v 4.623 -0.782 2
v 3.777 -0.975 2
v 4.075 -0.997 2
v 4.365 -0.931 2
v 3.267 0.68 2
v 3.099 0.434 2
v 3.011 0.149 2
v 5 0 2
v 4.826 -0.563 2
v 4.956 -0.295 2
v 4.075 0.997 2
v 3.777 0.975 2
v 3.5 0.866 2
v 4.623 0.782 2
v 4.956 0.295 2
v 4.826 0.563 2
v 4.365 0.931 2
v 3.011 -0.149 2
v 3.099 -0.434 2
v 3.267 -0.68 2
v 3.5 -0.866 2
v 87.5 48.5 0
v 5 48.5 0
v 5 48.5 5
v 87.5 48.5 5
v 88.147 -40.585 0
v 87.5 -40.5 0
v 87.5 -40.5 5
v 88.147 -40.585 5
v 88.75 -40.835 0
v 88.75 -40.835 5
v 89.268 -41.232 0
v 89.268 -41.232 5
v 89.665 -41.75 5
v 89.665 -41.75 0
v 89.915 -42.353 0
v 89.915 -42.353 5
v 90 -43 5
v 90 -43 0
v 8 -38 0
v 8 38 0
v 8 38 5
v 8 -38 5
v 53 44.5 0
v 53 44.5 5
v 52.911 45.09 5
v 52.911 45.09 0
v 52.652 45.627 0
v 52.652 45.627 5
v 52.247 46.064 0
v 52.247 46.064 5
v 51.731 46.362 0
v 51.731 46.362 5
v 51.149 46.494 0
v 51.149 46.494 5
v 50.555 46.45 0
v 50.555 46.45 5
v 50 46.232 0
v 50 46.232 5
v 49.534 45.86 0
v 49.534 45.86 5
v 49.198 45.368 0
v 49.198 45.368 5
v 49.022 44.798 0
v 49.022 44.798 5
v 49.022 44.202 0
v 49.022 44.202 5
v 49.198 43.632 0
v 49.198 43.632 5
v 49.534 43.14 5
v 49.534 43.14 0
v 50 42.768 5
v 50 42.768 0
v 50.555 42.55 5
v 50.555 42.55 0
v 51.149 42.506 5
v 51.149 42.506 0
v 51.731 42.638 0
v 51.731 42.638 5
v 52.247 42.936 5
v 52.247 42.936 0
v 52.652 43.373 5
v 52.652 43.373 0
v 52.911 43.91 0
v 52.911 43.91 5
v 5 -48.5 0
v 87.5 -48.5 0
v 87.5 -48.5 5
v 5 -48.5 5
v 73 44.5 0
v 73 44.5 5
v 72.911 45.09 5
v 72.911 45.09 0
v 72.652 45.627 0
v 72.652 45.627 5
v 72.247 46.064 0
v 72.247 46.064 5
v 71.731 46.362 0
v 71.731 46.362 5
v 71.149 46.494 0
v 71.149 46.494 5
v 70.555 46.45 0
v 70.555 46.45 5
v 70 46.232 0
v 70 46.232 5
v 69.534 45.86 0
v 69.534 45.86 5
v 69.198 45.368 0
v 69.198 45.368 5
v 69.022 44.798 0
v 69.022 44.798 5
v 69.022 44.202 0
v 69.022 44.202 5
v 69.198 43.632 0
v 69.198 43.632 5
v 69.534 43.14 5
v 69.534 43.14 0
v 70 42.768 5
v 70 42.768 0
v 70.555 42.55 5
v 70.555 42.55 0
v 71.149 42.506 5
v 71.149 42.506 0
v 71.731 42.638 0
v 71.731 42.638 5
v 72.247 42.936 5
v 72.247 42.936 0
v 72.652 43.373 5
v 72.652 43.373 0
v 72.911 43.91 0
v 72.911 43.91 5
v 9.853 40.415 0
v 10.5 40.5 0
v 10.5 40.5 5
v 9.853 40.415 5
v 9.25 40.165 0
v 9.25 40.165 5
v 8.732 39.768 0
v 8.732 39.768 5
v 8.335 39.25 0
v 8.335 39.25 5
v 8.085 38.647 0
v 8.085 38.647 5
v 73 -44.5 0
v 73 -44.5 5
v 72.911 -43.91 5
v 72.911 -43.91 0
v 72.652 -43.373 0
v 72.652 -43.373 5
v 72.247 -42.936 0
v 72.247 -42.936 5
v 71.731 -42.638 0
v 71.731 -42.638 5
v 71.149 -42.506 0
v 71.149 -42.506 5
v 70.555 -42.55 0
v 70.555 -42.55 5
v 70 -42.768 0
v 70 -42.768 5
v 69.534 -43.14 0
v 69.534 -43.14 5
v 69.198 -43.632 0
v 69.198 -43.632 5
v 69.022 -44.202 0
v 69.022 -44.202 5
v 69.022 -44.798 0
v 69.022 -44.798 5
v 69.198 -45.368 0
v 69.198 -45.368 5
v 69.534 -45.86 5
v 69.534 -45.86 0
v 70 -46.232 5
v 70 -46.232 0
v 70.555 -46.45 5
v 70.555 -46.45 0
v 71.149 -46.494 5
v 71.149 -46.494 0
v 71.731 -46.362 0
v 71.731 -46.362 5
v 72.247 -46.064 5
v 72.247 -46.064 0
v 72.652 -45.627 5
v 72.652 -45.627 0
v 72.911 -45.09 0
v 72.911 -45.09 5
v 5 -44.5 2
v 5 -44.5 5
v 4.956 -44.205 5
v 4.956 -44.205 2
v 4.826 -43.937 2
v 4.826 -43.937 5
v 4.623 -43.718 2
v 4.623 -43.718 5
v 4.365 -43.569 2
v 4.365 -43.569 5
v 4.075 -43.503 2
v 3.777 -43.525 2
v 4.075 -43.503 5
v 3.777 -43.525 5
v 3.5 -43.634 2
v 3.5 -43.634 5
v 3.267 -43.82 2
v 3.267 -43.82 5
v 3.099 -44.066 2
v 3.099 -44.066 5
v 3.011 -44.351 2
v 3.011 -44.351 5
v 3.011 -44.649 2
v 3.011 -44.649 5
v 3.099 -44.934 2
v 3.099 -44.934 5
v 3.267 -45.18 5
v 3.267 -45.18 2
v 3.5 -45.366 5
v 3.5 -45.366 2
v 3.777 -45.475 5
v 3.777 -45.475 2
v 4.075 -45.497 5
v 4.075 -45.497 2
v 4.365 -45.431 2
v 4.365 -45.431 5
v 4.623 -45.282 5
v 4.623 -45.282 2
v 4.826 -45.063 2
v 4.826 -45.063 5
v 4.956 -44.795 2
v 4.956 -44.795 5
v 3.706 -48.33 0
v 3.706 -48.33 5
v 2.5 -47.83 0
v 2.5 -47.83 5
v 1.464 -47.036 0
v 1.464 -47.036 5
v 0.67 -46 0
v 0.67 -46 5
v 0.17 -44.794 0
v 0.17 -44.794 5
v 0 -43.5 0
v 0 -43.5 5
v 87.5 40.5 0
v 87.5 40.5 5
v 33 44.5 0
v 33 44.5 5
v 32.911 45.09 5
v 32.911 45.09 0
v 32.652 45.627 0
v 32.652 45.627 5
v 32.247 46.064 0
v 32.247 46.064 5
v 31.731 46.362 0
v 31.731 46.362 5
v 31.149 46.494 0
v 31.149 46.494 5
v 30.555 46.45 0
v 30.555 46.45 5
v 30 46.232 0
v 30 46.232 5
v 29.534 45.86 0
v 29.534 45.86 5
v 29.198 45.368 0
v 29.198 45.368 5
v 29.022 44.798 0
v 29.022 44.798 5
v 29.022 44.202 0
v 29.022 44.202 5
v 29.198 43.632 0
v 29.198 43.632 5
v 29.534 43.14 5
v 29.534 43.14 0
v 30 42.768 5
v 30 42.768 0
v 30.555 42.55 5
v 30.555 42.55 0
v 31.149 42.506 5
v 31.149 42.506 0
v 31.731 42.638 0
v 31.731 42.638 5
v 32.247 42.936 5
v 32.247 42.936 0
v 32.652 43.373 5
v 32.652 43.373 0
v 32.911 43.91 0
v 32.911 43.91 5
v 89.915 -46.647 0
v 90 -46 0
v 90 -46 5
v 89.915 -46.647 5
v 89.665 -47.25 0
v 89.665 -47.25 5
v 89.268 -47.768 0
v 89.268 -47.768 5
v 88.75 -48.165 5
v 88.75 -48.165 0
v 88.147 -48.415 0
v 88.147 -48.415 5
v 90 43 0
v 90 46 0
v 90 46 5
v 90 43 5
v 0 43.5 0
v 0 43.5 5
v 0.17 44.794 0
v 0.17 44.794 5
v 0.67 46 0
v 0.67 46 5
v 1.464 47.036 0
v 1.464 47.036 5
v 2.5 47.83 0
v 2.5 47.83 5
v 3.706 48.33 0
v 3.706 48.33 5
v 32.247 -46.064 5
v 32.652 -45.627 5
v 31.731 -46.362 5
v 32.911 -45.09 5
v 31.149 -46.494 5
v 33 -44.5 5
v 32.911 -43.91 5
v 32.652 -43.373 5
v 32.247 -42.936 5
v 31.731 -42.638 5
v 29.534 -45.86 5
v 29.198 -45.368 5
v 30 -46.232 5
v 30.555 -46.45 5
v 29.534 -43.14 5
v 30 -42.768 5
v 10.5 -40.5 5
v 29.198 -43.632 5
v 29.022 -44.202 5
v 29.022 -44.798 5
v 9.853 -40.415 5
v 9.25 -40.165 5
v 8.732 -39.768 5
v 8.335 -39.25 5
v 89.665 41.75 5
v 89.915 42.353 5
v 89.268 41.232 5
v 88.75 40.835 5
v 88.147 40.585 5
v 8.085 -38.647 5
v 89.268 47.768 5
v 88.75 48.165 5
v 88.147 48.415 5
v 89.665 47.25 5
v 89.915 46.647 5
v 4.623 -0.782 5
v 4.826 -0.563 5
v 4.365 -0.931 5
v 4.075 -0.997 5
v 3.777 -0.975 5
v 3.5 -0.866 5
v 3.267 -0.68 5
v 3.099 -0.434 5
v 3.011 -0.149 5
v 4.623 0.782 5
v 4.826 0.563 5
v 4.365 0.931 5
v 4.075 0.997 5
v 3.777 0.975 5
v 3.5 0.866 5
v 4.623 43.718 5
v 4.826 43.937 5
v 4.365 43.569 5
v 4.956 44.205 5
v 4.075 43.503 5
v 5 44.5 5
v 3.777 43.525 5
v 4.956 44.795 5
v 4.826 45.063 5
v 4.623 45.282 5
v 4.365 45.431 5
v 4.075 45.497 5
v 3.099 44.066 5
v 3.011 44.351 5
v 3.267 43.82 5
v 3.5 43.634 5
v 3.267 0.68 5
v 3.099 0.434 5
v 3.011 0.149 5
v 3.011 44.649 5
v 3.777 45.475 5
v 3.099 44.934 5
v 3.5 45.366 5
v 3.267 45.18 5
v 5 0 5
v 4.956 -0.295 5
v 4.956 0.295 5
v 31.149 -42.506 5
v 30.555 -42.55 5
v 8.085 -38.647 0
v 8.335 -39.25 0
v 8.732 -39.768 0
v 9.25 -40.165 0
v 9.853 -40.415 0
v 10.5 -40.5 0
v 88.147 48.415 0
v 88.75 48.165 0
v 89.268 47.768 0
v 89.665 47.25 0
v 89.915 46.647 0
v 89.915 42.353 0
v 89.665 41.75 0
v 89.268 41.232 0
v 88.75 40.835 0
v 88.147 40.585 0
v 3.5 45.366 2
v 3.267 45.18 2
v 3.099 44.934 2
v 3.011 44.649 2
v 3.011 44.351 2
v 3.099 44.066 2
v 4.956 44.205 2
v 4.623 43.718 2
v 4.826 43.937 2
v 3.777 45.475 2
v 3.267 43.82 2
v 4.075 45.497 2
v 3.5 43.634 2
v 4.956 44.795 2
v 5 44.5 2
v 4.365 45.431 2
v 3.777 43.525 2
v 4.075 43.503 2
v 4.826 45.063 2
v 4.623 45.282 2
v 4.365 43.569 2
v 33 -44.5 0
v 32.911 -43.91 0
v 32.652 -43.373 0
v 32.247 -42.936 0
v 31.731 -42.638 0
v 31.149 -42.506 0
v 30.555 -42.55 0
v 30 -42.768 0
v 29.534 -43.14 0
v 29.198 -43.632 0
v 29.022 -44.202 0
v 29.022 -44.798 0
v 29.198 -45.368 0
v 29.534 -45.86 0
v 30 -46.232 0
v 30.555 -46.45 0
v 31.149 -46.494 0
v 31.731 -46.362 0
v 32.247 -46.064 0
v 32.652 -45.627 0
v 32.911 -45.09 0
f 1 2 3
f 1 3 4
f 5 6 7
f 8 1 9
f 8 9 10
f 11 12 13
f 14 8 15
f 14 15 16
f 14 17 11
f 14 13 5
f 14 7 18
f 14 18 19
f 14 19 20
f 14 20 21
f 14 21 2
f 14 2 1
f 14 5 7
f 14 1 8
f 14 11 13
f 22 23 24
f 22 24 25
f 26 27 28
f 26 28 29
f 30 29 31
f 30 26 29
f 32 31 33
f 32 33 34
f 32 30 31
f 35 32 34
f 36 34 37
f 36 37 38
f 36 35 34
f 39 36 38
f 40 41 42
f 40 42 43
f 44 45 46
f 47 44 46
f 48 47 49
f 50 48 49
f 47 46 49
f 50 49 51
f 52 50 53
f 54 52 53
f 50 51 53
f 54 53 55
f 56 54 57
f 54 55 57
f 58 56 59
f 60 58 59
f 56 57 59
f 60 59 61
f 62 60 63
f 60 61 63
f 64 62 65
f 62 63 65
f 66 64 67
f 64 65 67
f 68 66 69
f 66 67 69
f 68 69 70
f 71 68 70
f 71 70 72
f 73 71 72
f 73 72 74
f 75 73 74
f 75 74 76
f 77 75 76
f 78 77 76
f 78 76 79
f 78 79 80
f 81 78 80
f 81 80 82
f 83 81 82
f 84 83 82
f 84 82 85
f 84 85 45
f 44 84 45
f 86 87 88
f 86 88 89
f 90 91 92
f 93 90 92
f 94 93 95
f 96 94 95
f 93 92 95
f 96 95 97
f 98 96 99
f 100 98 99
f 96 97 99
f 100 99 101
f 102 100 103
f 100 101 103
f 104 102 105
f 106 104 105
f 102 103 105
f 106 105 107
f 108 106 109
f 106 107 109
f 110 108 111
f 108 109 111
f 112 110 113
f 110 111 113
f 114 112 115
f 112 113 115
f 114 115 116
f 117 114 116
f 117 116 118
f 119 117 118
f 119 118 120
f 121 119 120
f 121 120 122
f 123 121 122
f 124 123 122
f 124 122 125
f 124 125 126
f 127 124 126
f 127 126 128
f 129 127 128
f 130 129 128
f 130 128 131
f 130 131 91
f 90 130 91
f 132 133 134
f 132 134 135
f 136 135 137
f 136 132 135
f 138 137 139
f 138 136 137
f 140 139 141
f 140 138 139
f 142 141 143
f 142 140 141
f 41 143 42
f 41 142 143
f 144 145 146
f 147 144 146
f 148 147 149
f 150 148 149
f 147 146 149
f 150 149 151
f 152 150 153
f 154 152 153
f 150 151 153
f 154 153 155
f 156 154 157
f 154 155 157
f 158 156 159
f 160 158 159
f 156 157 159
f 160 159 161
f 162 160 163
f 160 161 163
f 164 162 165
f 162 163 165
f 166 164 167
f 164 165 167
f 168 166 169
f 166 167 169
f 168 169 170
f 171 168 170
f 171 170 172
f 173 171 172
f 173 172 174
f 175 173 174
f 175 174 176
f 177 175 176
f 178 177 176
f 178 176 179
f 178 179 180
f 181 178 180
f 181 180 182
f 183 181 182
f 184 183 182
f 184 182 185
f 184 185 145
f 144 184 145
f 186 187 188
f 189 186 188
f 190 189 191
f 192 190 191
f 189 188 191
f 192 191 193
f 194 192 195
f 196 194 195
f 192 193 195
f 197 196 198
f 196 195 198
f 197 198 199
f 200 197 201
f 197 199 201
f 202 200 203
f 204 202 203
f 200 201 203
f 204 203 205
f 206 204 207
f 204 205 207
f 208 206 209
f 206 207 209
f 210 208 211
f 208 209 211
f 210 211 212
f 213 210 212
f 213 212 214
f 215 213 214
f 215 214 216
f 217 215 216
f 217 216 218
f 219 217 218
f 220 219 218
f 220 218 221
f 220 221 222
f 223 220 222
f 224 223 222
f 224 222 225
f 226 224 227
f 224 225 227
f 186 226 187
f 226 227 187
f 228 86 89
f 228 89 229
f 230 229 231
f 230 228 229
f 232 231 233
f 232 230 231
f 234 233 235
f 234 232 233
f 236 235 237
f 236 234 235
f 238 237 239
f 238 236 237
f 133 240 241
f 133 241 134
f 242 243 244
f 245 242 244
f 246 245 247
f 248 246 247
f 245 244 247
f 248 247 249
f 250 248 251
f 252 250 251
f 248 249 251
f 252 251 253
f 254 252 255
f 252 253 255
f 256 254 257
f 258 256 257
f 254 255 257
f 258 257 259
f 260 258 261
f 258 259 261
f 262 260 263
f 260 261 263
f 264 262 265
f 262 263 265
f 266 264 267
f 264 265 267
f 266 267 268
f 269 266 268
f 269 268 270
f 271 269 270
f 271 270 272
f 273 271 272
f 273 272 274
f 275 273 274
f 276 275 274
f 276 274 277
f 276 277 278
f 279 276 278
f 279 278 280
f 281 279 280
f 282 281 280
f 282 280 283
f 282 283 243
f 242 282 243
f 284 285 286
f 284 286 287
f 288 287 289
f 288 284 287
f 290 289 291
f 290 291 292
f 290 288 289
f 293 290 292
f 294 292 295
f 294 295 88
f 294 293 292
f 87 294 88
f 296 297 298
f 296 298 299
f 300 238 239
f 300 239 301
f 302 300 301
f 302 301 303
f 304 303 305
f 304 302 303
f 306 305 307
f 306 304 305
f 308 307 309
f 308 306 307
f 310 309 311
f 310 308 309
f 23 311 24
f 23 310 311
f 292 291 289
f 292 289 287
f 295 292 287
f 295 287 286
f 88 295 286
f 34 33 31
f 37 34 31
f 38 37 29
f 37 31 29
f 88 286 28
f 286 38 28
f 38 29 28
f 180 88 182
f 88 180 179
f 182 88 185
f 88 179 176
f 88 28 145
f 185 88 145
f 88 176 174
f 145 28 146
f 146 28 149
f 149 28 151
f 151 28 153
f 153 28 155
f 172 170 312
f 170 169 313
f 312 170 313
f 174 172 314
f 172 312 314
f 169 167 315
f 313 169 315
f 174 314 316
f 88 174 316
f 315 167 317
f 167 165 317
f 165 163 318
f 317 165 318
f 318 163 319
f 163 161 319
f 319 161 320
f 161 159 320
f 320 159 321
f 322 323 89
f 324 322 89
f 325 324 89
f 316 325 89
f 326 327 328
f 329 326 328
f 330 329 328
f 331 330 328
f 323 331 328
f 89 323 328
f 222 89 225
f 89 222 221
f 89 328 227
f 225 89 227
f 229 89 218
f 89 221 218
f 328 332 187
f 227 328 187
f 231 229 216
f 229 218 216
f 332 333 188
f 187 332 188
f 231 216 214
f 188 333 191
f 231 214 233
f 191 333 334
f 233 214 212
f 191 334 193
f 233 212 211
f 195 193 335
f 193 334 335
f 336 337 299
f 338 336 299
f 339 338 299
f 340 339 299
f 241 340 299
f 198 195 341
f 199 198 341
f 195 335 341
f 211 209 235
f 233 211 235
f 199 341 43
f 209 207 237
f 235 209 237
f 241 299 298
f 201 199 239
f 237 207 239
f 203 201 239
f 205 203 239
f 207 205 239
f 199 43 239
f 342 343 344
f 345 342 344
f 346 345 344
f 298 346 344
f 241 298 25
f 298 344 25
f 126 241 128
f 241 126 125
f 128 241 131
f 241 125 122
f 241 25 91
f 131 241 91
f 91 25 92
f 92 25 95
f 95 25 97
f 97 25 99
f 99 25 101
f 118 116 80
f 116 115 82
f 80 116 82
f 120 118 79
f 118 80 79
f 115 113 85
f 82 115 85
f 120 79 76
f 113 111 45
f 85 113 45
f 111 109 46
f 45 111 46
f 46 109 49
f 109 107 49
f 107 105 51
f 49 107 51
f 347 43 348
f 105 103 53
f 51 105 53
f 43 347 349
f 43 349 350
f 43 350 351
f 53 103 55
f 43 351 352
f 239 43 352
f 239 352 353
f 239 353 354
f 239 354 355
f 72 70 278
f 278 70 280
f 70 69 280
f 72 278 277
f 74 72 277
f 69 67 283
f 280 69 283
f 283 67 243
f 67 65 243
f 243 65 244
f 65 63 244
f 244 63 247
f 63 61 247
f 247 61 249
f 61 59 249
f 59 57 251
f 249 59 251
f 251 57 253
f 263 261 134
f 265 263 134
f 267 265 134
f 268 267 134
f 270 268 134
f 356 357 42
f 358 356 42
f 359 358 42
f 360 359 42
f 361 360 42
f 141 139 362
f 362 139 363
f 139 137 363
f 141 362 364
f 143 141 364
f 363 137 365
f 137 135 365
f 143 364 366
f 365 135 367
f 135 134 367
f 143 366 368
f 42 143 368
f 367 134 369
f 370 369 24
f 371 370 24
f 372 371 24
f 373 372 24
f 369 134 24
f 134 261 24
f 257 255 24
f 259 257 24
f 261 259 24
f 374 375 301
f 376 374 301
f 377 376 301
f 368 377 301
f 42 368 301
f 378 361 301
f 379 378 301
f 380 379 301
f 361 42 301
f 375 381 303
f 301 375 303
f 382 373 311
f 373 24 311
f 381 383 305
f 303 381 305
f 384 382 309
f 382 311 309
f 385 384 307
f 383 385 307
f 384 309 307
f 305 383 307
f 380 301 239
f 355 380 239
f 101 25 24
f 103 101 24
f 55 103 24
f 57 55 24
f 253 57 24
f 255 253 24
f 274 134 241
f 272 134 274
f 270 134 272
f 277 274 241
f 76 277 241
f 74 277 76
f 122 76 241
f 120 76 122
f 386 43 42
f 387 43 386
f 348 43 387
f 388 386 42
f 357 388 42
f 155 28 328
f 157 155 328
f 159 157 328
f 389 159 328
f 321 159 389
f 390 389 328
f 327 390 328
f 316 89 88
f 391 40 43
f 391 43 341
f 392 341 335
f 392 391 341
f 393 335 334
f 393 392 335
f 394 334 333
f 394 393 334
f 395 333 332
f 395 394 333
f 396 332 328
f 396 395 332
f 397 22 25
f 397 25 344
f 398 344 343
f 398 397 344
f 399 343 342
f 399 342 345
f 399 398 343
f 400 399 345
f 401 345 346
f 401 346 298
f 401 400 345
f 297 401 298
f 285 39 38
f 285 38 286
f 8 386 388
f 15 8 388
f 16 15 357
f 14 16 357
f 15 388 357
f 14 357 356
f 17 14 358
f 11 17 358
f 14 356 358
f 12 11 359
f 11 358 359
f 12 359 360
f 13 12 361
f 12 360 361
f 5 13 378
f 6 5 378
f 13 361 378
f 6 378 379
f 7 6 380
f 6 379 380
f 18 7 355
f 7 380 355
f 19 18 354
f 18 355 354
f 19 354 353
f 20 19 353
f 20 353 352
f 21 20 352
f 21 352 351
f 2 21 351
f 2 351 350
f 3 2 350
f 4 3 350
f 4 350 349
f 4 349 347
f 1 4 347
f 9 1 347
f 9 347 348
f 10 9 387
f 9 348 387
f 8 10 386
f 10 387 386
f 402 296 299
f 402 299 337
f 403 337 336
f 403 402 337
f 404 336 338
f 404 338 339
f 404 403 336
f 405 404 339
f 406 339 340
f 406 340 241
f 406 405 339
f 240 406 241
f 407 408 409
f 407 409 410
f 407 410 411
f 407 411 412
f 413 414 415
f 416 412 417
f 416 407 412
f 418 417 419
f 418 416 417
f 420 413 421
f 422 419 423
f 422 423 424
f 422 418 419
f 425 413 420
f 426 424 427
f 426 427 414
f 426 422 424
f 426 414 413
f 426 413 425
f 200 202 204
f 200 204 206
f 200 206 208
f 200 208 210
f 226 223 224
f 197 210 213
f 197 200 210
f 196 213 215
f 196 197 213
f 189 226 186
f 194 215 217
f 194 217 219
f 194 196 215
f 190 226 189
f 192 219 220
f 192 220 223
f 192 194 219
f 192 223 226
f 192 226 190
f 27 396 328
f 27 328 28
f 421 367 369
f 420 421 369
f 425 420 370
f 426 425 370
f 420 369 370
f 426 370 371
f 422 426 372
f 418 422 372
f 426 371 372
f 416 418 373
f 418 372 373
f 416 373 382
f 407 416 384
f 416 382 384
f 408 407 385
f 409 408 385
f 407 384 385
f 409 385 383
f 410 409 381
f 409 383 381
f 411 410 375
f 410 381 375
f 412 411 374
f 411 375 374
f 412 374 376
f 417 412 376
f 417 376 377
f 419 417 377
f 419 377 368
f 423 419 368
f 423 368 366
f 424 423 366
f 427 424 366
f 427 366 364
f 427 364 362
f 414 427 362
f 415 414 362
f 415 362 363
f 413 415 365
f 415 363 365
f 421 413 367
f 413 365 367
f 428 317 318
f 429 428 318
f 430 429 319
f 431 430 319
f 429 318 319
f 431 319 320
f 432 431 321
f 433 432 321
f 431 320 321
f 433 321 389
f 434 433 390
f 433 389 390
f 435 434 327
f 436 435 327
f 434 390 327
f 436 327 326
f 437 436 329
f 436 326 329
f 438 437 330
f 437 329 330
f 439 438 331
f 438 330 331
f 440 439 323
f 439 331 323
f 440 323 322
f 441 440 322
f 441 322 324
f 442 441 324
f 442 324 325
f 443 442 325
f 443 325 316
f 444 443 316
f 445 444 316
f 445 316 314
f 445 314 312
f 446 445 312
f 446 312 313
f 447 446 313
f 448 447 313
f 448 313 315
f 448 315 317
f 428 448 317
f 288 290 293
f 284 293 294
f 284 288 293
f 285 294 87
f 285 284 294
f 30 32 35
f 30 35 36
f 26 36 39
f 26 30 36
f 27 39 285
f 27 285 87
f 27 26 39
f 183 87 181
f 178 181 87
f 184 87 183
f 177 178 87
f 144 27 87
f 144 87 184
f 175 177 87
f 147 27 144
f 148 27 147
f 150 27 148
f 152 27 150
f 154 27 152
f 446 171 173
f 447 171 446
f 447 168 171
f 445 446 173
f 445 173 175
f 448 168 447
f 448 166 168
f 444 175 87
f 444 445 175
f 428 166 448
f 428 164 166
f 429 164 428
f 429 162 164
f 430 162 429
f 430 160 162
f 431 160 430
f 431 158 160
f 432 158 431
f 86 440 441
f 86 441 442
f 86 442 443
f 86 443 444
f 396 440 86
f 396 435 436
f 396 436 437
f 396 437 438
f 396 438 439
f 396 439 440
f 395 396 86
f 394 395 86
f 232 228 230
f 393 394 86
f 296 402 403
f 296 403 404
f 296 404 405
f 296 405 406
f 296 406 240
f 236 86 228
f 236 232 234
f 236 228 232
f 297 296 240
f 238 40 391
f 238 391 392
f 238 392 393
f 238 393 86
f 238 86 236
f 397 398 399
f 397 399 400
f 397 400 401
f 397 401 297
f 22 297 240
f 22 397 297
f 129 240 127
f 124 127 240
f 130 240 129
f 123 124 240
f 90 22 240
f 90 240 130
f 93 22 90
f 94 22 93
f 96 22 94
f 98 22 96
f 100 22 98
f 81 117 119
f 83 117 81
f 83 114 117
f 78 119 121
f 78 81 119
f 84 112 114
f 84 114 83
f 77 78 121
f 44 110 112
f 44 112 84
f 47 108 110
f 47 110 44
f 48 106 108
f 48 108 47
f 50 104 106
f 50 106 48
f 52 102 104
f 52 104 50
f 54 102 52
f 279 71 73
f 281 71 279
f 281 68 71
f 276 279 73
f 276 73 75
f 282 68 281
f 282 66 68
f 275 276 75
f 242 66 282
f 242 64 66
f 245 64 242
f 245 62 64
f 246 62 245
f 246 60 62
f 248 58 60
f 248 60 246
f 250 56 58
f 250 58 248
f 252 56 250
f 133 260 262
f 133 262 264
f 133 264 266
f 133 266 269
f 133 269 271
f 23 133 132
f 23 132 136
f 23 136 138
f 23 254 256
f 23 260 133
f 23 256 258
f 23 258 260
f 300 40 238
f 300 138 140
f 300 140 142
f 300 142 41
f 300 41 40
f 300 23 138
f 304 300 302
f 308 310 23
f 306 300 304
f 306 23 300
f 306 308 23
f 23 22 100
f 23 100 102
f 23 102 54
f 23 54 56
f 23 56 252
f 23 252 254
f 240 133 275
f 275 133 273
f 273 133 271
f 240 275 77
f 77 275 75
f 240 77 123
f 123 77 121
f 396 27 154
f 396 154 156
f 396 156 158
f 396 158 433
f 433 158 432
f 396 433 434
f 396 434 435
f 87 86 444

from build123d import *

# Parameters (mm, degrees)
BOSS_EXTRUDE1_DEPTH = 5
SKETCH4_R           = 2
CUT_EXTRUDE1_DEPTH  = 6
SKETCH5_R           = 1
CUT_EXTRUDE2_DEPTH  = 3


with BuildPart() as part:
    # Sketch1 → Boss-Extrude1 (new body)
    with BuildSketch(Plane.XY):
        with BuildLine():
            Line((0, -43.5), (0, 43.5))
            ThreePointArc((0, 43.5), (1.464466094, 47.035533906), (5, 48.5))
            Line((5, 48.5), (87.5, 48.5))
            ThreePointArc((87.5, 48.5), (89.267766953, 47.767766953), (90, 46))
            Line((90, 46), (90, 43))
            ThreePointArc((90, 43), (89.267766953, 41.232233047), (87.5, 40.5))
            Line((87.5, 40.5), (10.5, 40.5))
            ThreePointArc((10.5, 40.5), (8.732233047, 39.767766953), (8, 38))
            Line((8, 38), (8, -38))
            ThreePointArc((8, -38), (8.732233047, -39.767766953), (10.5, -40.5))
            Line((10.5, -40.5), (87.5, -40.5))
            ThreePointArc((87.5, -40.5), (89.267766953, -41.232233047), (90, -43))
            Line((90, -43), (90, -46))
            ThreePointArc((90, -46), (89.267766953, -47.767766953), (87.5, -48.5))
            Line((87.5, -48.5), (5, -48.5))
            ThreePointArc((5, -48.5), (1.464466094, -47.035533906), (0, -43.5))
        make_face()
    extrude(amount=BOSS_EXTRUDE1_DEPTH)

    # Sketch4 → Cut-Extrude1 (cut, through all)
    with BuildSketch(Plane.XY.offset(5)):
        with Locations((71, 44.5)):
            Circle(SKETCH4_R)
        with Locations((31, 44.5)):
            Circle(SKETCH4_R)
        with Locations((71, -44.5)):
            Circle(SKETCH4_R)
        with Locations((31, -44.5)):
            Circle(SKETCH4_R)
        with Locations((51, 44.5)):
            Circle(SKETCH4_R)
    extrude(amount=-CUT_EXTRUDE1_DEPTH, mode=Mode.SUBTRACT)

    # Sketch5 → Cut-Extrude2 (cut)
    with BuildSketch(Plane.XY.offset(5)):
        with Locations((4, 44.5)):
            Circle(SKETCH5_R)
        with Locations((4, 0)):
            Circle(SKETCH5_R)
        with Locations((4, -44.5)):
            Circle(SKETCH5_R)
    extrude(amount=-CUT_EXTRUDE2_DEPTH, mode=Mode.SUBTRACT)


solid = part.part
